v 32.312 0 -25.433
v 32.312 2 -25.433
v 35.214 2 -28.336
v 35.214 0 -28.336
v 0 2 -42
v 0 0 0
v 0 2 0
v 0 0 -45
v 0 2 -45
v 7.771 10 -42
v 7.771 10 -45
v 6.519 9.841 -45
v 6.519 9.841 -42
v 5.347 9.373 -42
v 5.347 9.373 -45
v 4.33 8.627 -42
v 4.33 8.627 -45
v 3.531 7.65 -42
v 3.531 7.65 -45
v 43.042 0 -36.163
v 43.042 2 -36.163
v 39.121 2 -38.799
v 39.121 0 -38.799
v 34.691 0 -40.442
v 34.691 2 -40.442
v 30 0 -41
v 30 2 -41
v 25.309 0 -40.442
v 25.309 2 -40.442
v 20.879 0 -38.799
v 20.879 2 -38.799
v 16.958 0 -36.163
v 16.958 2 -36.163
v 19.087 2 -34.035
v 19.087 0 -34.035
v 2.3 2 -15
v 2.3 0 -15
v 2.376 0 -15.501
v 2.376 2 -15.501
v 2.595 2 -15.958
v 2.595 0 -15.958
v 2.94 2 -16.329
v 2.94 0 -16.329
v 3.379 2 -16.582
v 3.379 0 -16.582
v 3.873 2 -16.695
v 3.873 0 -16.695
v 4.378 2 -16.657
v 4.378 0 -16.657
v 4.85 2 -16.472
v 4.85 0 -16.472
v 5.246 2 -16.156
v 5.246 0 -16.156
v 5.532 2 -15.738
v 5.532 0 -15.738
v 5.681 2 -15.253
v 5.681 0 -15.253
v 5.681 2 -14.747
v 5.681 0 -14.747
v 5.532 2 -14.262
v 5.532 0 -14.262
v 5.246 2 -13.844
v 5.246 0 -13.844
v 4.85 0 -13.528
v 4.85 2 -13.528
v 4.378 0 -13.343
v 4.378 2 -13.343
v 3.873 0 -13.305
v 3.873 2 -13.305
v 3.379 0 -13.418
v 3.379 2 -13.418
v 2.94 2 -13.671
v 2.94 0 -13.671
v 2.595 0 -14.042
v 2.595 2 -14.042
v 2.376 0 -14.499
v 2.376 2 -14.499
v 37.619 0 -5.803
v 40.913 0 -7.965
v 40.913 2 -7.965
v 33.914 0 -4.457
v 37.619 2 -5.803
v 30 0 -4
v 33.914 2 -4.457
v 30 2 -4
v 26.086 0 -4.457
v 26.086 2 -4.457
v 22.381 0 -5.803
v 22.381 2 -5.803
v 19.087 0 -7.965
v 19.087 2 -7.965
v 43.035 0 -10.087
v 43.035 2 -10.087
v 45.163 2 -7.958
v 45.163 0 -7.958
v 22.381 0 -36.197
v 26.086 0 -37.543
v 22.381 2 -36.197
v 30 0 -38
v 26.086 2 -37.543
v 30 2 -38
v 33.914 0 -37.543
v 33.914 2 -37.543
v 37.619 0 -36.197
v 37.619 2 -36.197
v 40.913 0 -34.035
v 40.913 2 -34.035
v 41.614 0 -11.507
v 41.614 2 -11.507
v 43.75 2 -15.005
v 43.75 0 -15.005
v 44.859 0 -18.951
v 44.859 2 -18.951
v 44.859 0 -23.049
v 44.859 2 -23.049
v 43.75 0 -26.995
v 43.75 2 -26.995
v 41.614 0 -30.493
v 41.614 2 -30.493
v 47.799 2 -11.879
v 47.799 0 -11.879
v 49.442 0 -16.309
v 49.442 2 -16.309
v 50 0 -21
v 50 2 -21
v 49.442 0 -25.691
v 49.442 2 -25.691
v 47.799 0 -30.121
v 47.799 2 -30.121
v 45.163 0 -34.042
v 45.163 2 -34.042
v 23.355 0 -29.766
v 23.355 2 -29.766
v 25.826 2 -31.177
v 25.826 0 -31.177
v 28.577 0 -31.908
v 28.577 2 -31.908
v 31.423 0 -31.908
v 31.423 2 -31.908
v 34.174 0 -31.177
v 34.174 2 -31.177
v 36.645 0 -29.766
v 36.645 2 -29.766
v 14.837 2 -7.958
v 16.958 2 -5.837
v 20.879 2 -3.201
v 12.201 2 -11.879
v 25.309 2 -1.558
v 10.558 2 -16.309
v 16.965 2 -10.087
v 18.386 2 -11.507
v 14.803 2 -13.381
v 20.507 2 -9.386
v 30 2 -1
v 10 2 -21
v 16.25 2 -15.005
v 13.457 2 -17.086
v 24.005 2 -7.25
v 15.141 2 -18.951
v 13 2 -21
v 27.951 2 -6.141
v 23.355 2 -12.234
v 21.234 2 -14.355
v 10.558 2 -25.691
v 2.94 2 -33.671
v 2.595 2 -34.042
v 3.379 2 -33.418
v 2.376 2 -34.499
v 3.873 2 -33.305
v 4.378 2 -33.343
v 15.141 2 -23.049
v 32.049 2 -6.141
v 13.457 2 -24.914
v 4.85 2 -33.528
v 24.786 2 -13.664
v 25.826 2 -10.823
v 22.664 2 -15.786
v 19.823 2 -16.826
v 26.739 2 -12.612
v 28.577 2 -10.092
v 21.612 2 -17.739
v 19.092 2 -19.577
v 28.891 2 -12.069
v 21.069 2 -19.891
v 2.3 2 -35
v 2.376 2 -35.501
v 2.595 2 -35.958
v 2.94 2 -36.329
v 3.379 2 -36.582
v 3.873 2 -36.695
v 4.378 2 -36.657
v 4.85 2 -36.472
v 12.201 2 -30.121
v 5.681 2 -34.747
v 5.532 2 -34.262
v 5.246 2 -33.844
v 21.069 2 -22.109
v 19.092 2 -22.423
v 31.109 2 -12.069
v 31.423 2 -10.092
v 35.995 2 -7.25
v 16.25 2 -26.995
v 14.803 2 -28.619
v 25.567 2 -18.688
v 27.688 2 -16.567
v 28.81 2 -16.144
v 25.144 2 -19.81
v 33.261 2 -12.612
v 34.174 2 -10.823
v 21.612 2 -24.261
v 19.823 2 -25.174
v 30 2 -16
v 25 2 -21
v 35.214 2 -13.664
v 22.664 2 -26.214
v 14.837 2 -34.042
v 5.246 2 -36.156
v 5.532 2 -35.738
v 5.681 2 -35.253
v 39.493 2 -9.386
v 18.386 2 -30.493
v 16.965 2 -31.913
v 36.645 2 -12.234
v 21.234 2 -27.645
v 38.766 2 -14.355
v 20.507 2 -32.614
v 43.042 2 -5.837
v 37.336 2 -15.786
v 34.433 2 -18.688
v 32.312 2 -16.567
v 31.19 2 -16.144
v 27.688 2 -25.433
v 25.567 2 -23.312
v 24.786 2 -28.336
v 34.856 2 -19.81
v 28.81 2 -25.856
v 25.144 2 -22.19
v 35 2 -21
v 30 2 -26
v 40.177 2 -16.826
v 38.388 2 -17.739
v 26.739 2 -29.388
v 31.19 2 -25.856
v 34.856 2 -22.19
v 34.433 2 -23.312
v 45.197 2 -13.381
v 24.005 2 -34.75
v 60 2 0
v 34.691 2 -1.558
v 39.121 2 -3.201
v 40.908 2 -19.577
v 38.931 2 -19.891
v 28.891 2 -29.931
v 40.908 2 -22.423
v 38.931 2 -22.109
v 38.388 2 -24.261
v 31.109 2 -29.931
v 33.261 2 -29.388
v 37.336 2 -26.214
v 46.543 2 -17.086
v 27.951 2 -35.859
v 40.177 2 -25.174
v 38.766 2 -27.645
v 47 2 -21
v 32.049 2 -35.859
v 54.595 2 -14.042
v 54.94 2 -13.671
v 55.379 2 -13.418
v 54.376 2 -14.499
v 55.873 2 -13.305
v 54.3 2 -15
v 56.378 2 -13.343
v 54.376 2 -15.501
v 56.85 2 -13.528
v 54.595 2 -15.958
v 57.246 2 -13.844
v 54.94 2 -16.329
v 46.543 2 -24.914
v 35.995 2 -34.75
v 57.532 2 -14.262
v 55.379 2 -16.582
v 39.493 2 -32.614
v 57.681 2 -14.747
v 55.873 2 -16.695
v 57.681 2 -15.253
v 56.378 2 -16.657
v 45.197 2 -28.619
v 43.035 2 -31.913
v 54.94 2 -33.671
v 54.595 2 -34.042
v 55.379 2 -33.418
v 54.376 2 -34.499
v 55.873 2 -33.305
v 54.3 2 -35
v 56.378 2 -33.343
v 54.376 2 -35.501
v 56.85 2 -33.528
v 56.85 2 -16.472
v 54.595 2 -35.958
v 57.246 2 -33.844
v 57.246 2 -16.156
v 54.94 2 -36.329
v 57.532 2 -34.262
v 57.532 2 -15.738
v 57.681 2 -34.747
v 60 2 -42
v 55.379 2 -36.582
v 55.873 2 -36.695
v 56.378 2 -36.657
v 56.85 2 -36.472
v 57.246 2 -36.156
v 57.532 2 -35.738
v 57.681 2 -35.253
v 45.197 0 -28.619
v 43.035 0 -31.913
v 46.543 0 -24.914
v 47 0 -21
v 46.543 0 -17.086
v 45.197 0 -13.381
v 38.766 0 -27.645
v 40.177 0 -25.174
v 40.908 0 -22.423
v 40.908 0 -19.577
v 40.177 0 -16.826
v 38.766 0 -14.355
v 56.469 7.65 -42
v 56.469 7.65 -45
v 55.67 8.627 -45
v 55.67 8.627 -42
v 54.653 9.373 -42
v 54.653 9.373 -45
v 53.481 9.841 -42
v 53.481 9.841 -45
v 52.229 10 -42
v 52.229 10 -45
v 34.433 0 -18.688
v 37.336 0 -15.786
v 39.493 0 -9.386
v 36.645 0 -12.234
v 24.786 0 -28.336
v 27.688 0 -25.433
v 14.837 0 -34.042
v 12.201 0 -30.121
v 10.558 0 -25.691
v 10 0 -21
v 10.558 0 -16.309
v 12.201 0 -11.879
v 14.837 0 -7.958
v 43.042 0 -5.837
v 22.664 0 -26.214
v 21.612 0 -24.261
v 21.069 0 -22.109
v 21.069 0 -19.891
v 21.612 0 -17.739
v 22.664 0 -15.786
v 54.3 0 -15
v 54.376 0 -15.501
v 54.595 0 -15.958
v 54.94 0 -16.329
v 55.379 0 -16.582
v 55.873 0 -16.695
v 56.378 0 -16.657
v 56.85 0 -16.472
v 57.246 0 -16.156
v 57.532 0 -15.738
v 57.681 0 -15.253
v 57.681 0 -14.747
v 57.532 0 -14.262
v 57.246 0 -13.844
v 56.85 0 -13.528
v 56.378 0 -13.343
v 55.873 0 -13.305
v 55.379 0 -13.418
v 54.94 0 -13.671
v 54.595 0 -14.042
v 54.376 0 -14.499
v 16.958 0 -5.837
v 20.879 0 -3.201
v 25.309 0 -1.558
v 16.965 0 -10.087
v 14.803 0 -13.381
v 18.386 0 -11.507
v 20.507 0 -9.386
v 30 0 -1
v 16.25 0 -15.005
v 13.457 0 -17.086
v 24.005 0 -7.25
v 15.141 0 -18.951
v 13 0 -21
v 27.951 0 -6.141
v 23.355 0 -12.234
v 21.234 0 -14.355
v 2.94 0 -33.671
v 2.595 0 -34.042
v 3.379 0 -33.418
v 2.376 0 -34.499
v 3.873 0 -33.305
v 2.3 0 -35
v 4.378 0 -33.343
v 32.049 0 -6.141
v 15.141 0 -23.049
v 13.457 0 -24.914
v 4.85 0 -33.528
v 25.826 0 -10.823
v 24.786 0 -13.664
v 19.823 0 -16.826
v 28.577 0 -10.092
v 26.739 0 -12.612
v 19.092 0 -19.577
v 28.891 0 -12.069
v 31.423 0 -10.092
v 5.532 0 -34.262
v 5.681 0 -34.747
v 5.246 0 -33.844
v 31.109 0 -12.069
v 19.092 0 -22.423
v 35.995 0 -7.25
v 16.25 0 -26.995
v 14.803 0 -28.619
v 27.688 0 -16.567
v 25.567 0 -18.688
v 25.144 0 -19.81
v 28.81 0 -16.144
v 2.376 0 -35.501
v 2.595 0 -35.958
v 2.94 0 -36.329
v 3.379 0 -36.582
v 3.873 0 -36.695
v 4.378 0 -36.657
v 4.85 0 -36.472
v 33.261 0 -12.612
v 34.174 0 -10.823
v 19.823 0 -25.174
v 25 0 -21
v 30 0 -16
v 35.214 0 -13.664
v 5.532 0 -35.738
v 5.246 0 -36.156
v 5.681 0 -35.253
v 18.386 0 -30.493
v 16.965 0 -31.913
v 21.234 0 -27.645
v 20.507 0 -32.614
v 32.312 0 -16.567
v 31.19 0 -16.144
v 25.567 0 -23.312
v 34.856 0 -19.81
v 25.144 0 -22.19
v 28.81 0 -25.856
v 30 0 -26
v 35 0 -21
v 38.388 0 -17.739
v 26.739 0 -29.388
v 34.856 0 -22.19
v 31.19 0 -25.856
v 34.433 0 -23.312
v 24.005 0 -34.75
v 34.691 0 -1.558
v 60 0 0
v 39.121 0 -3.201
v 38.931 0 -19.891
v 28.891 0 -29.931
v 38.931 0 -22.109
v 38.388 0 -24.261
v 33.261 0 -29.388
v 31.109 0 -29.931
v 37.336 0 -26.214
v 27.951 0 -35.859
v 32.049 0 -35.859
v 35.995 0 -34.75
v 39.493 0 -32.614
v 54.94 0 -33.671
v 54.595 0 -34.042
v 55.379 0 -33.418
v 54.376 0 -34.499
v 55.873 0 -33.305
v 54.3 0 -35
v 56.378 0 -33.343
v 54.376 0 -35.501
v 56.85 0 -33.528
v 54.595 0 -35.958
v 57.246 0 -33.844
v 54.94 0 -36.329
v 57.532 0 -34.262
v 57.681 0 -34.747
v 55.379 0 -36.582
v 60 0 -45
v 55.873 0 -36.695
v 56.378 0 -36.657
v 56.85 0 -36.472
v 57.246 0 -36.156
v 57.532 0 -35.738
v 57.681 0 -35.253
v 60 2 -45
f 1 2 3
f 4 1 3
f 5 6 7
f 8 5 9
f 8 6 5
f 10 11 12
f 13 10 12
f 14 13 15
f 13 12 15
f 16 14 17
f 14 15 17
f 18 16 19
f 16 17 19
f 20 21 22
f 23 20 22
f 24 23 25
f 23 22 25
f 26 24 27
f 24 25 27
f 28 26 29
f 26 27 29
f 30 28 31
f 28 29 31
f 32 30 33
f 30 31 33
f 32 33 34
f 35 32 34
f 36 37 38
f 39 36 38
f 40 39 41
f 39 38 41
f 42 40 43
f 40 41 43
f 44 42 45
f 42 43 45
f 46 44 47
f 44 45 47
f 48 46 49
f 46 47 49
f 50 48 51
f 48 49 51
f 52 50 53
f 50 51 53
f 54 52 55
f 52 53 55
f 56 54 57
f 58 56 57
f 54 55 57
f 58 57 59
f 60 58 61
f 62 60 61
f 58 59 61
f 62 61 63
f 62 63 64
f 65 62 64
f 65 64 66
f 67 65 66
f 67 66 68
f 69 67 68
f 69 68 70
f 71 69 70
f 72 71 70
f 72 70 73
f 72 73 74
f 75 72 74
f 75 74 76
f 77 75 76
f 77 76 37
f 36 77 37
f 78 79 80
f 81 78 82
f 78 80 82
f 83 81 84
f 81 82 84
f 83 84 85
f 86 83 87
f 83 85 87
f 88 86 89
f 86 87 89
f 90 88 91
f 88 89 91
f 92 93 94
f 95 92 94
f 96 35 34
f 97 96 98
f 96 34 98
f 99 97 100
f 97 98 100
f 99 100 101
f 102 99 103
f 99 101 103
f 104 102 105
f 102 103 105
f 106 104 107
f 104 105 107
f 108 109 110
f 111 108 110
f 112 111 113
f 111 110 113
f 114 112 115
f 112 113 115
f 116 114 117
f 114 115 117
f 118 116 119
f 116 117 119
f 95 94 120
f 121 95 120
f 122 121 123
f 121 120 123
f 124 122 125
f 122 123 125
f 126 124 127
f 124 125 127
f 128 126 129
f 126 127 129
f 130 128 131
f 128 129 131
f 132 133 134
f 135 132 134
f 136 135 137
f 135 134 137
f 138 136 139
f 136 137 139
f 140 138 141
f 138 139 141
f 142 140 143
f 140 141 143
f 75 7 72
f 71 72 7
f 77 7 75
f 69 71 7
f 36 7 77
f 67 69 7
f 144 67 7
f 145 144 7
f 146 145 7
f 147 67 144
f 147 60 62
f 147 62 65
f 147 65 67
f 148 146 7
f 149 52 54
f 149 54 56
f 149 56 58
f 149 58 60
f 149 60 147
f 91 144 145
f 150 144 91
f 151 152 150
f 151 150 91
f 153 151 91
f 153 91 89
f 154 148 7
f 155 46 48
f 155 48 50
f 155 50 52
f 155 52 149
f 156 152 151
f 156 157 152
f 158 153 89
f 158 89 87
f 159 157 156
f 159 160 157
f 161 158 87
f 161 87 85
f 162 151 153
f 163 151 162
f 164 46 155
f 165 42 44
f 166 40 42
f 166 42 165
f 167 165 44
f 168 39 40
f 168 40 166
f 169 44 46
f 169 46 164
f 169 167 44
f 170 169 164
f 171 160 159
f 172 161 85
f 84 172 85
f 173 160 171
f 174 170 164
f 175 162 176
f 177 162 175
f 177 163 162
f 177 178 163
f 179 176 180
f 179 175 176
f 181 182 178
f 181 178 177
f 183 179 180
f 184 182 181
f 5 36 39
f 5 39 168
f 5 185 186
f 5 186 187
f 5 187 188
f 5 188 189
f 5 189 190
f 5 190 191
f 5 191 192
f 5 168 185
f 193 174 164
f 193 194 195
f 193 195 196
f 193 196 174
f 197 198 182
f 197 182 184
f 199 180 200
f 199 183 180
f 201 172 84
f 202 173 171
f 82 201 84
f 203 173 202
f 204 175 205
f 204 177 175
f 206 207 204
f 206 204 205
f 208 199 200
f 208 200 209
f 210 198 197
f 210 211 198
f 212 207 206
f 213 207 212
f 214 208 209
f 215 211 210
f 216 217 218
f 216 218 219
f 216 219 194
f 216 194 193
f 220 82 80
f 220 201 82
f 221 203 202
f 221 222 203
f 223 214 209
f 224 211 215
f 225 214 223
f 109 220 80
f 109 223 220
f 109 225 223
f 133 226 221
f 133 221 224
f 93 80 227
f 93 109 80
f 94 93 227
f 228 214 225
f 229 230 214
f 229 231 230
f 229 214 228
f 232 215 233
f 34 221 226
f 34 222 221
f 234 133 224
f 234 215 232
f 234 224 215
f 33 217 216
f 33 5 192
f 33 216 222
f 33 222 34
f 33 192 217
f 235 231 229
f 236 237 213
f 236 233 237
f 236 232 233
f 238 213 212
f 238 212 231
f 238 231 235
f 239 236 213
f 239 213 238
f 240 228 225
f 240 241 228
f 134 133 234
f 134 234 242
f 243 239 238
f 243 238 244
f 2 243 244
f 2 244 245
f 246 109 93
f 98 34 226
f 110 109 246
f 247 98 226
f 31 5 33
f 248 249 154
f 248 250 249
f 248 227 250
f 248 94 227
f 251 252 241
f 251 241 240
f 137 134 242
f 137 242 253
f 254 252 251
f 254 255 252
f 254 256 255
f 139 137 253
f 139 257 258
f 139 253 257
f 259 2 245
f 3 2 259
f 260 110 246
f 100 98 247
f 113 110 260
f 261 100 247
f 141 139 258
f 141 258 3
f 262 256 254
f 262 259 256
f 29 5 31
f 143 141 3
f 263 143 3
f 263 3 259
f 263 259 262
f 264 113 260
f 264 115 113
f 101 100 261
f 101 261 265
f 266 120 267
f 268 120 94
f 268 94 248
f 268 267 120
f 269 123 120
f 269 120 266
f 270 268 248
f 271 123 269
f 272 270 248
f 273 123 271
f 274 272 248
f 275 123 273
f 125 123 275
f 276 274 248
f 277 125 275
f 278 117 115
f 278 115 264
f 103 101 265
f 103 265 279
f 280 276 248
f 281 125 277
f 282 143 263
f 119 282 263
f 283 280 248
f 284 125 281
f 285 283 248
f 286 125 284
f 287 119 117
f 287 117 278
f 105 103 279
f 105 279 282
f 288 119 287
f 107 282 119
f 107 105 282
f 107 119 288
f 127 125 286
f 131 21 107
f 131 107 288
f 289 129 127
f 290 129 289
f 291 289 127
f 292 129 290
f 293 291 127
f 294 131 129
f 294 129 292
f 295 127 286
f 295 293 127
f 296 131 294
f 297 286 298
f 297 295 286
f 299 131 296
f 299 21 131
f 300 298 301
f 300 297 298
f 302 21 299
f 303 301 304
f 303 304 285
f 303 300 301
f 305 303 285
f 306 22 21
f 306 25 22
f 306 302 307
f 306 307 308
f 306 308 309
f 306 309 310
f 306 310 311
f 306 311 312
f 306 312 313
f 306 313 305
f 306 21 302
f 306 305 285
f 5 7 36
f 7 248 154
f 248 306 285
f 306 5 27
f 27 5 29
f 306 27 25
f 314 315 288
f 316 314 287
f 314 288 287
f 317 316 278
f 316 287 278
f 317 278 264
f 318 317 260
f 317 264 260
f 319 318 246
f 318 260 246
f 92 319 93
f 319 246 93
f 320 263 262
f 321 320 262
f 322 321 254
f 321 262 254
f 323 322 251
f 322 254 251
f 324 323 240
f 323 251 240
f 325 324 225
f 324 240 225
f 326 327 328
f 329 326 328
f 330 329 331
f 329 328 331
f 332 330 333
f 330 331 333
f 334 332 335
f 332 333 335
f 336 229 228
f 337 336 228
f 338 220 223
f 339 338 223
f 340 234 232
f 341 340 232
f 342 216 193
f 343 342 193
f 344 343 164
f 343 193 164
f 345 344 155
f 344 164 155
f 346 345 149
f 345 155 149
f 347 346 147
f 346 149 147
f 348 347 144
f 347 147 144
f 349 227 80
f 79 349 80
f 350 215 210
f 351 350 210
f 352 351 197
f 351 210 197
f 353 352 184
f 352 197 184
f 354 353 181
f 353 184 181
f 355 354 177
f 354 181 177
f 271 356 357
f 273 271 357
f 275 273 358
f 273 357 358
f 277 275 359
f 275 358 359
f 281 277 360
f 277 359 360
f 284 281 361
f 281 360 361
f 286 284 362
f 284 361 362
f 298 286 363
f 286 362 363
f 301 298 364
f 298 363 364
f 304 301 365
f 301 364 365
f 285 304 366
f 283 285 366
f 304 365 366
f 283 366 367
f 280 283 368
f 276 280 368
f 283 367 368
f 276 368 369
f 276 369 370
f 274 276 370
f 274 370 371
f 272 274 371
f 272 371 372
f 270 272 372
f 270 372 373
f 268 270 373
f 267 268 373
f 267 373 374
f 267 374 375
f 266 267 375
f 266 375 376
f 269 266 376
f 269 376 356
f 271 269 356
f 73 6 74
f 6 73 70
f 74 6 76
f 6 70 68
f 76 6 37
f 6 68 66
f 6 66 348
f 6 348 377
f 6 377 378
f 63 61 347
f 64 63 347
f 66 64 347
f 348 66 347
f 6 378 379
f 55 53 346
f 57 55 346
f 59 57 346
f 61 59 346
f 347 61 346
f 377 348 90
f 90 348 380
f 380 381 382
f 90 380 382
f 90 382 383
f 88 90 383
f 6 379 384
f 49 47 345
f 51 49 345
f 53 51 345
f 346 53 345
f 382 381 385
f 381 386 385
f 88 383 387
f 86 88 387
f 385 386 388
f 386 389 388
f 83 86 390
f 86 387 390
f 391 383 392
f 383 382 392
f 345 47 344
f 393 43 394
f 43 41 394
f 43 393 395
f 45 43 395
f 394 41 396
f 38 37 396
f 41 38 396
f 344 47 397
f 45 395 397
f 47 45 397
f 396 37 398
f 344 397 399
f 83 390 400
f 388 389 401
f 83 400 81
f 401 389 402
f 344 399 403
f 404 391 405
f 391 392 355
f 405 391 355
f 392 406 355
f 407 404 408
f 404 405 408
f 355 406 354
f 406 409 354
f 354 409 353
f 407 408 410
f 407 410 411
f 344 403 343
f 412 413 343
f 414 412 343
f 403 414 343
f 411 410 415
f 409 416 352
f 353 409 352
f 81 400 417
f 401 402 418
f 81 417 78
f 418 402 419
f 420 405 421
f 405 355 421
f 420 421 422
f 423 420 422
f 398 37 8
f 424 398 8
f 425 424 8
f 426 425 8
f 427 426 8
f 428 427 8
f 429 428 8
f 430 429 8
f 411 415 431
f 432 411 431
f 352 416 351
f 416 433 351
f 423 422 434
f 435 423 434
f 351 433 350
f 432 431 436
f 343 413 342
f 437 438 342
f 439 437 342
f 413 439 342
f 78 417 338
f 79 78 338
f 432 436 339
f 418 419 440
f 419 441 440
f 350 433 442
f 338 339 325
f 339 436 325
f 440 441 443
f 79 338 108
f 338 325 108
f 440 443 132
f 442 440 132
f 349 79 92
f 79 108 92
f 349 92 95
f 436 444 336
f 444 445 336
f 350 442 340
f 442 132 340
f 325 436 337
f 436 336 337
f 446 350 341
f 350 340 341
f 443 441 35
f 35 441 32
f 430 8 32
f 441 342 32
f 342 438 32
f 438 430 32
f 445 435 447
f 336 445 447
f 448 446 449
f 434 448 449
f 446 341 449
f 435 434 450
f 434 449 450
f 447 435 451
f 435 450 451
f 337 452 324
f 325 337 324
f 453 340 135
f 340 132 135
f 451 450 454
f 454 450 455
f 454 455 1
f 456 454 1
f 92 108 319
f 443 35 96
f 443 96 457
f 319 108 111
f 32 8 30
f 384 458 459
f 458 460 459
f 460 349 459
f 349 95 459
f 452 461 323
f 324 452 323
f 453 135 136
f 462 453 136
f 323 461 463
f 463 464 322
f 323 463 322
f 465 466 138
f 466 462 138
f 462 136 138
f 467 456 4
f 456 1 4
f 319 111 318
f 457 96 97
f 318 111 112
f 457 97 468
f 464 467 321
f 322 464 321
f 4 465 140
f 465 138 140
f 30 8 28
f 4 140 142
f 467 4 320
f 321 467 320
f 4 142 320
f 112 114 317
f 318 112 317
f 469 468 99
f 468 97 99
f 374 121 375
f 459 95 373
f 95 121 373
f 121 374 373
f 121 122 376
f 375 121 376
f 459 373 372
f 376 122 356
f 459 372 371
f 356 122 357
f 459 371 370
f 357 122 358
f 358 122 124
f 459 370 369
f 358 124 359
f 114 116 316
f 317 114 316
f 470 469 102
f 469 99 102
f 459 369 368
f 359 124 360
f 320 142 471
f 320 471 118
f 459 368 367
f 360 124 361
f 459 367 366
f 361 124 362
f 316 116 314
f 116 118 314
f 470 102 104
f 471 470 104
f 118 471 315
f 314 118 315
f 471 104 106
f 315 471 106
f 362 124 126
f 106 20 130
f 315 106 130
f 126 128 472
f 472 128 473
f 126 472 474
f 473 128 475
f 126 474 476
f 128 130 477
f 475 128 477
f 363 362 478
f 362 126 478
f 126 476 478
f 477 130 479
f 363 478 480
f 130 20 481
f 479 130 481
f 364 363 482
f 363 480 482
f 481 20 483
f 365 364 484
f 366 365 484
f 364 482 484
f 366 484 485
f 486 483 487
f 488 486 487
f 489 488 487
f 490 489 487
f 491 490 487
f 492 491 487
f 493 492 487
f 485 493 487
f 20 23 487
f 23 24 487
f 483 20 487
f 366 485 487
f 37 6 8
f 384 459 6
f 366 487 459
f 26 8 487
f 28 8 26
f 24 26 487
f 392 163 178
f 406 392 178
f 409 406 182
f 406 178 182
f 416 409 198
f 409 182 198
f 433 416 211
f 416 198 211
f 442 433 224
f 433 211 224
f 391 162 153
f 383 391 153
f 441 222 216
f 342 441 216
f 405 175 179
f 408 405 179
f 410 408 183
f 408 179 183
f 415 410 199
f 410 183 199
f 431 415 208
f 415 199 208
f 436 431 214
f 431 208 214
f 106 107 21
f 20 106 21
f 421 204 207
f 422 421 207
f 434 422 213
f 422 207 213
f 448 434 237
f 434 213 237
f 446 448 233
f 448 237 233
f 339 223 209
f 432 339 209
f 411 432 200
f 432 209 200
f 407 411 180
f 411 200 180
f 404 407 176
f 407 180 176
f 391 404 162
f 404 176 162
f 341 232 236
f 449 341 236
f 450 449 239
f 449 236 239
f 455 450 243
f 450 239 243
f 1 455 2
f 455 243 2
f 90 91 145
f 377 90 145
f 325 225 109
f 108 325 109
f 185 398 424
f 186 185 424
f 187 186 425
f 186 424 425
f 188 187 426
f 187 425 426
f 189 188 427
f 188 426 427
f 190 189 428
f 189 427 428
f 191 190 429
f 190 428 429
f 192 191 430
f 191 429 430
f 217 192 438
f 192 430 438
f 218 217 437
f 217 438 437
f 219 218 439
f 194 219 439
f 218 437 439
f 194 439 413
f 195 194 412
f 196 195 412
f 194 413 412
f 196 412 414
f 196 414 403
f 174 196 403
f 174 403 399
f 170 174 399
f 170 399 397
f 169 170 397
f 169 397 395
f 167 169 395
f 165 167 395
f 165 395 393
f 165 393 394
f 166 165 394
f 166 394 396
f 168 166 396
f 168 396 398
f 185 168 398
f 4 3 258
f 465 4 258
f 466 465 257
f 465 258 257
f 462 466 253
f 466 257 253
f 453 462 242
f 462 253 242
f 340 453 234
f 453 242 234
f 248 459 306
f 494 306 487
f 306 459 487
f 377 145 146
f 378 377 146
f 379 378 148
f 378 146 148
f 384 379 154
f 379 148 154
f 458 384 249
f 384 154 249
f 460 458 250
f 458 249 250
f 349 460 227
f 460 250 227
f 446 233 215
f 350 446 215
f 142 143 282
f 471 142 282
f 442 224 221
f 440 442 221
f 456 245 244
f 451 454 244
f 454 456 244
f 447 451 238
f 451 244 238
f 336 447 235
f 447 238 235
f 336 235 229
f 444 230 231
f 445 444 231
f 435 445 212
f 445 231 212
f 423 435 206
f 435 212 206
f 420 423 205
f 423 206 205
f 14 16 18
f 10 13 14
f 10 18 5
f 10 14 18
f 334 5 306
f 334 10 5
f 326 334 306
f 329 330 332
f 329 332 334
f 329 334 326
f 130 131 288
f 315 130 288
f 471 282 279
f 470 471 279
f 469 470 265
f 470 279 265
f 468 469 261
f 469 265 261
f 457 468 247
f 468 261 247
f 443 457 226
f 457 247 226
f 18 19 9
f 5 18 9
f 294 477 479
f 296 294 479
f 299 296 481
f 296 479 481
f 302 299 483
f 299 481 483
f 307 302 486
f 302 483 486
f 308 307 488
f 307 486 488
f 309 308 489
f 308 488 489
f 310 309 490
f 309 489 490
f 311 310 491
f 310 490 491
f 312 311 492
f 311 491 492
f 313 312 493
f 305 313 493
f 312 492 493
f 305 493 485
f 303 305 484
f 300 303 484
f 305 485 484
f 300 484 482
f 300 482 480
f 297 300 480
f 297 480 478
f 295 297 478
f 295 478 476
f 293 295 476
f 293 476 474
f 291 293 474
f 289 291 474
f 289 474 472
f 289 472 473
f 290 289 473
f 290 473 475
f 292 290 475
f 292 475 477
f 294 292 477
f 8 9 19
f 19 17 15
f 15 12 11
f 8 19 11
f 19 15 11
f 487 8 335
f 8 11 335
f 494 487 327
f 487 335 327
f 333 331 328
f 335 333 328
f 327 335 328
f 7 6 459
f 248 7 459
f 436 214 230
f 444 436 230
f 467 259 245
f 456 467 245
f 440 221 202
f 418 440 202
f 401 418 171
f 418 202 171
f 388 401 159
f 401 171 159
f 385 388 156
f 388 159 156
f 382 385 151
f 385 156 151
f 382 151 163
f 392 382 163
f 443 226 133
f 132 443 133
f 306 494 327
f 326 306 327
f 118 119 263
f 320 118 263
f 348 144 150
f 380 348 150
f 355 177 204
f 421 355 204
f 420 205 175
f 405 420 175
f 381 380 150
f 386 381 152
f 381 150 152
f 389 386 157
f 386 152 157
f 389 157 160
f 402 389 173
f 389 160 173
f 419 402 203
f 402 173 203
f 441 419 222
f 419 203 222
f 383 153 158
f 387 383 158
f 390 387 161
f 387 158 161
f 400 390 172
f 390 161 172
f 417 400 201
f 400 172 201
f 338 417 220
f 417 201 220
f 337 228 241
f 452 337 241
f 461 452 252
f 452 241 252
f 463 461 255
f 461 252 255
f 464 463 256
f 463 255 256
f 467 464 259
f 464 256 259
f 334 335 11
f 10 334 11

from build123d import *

# Parameters (mm, degrees)
SKETCH1_W                  = 60
SKETCH1_H                  = 45
BOSS_EXTRUDE1_DEPTH        = 2
F_3_4_3_4_DIAMETER_HOLE1_D = 3.4
SKETCH5_R                  = 2.5
AIR_HOLES_DEPTH            = 76.026661928
CIRPATTERN1_COUNT          = 4
SKETCH6_R                  = 2.5
BOSS_EXTRUDE3_DEPTH        = 2
BOSS_EXTRUDE5_DEPTH        = 3


with BuildPart() as part:
    # Sketch1 → Boss-Extrude1 (new body)
    with BuildSketch(Plane(origin=(0, 0, 0), x_dir=(1, 0, 0), z_dir=(0, 1, 0))):
        with Locations((30, 22.5)):
            Rectangle(SKETCH1_W, SKETCH1_H)
    extrude(amount=BOSS_EXTRUDE1_DEPTH)

    # Ø3.4 (3.4) Diameter Hole1 (through all)
    with Locations(Plane(origin=(0, 2, 0), x_dir=(1, 0, 0), z_dir=(0, 1, 0))):
        with Locations((4, 15), (4, 35), (56, 35), (56, 15)):
            Hole(F_3_4_3_4_DIAMETER_HOLE1_D / 2)

    # Sketch5 → Air holes (cut, through all)
    with BuildSketch(Plane(origin=(0, 2, 0), x_dir=(1, 0, 0), z_dir=(0, 1, 0))):
        with Locations(Location((30, 21, 0), (0, 0, 270))):
            Circle(SKETCH5_R)
        with BuildLine():
            Line((20.507224712, 32.614095631), (23.355142668, 29.766177675))
            ThreePointArc((23.355142668, 29.766177675), (30, 32), (36.644857332, 29.766177675))
            Line((36.644857332, 29.766177675), (39.492775288, 32.614095631))
            ThreePointArc((39.492775288, 32.614095631), (30, 36), (20.507224712, 32.614095631))
        make_face()
        with BuildLine():
            Line((24.785709973, 28.335610371), (27.687975781, 25.433344563))
            ThreePointArc((27.687975781, 25.433344563), (30, 26), (32.312024219, 25.433344563))
            Line((32.312024219, 25.433344563), (35.214290027, 28.335610371))
            ThreePointArc((35.214290027, 28.335610371), (30, 30), (24.785709973, 28.335610371))
        make_face()
        with BuildLine():
            Line((40.913269843, 34.034590187), (43.041644604, 36.162964948))
            ThreePointArc((43.041644604, 36.162964948), (30, 41), (16.958355396, 36.162964948))
            Line((16.958355396, 36.162964948), (19.086730157, 34.034590187))
            ThreePointArc((19.086730157, 34.034590187), (30, 38), (40.913269843, 34.034590187))
        make_face()
    air_holes = extrude(amount=-AIR_HOLES_DEPTH, mode=Mode.SUBTRACT)

    # CirPattern1: Air holes ×4 about axis
    cirpattern1_axis = Axis((30, 0, -21), (0, 1, 0))
    for i in range(1, CIRPATTERN1_COUNT):
        add(air_holes.rotate(cirpattern1_axis, i * 360 / CIRPATTERN1_COUNT), mode=Mode.SUBTRACT)

    # Sketch6 → Boss-Extrude3 (add)
    with BuildSketch(Plane(origin=(0, 2, 0), x_dir=(1, 0, 0), z_dir=(0, 1, 0))):
        with Locations((30, 21)):
            Circle(SKETCH6_R)
    extrude(amount=-BOSS_EXTRUDE3_DEPTH)

    # Sketch10 → Boss-Extrude5 (add)
    with BuildSketch(Plane(origin=(0, 0, -45), x_dir=(-1, 0, 0), z_dir=(0, 0, -1))):
        with BuildLine():
            Line((-60, 2), (-56.468753312, 7.6499947))
            ThreePointArc((-56.468753312, 7.6499947), (-54.652604454, 9.373212406), (-52.228761792, 10))
            Line((-52.228761792, 10), (-7.771238208, 10))
            ThreePointArc((-7.771238208, 10), (-5.347395546, 9.373212406), (-3.531246688, 7.6499947))
            Line((-3.531246688, 7.6499947), (0, 2))
            Line((0, 2), (0, 0))
            Line((0, 0), (-60, 0))
            Line((-60, 0), (-60, 2))
        make_face()
    extrude(amount=-BOSS_EXTRUDE5_DEPTH)


solid = part.part
